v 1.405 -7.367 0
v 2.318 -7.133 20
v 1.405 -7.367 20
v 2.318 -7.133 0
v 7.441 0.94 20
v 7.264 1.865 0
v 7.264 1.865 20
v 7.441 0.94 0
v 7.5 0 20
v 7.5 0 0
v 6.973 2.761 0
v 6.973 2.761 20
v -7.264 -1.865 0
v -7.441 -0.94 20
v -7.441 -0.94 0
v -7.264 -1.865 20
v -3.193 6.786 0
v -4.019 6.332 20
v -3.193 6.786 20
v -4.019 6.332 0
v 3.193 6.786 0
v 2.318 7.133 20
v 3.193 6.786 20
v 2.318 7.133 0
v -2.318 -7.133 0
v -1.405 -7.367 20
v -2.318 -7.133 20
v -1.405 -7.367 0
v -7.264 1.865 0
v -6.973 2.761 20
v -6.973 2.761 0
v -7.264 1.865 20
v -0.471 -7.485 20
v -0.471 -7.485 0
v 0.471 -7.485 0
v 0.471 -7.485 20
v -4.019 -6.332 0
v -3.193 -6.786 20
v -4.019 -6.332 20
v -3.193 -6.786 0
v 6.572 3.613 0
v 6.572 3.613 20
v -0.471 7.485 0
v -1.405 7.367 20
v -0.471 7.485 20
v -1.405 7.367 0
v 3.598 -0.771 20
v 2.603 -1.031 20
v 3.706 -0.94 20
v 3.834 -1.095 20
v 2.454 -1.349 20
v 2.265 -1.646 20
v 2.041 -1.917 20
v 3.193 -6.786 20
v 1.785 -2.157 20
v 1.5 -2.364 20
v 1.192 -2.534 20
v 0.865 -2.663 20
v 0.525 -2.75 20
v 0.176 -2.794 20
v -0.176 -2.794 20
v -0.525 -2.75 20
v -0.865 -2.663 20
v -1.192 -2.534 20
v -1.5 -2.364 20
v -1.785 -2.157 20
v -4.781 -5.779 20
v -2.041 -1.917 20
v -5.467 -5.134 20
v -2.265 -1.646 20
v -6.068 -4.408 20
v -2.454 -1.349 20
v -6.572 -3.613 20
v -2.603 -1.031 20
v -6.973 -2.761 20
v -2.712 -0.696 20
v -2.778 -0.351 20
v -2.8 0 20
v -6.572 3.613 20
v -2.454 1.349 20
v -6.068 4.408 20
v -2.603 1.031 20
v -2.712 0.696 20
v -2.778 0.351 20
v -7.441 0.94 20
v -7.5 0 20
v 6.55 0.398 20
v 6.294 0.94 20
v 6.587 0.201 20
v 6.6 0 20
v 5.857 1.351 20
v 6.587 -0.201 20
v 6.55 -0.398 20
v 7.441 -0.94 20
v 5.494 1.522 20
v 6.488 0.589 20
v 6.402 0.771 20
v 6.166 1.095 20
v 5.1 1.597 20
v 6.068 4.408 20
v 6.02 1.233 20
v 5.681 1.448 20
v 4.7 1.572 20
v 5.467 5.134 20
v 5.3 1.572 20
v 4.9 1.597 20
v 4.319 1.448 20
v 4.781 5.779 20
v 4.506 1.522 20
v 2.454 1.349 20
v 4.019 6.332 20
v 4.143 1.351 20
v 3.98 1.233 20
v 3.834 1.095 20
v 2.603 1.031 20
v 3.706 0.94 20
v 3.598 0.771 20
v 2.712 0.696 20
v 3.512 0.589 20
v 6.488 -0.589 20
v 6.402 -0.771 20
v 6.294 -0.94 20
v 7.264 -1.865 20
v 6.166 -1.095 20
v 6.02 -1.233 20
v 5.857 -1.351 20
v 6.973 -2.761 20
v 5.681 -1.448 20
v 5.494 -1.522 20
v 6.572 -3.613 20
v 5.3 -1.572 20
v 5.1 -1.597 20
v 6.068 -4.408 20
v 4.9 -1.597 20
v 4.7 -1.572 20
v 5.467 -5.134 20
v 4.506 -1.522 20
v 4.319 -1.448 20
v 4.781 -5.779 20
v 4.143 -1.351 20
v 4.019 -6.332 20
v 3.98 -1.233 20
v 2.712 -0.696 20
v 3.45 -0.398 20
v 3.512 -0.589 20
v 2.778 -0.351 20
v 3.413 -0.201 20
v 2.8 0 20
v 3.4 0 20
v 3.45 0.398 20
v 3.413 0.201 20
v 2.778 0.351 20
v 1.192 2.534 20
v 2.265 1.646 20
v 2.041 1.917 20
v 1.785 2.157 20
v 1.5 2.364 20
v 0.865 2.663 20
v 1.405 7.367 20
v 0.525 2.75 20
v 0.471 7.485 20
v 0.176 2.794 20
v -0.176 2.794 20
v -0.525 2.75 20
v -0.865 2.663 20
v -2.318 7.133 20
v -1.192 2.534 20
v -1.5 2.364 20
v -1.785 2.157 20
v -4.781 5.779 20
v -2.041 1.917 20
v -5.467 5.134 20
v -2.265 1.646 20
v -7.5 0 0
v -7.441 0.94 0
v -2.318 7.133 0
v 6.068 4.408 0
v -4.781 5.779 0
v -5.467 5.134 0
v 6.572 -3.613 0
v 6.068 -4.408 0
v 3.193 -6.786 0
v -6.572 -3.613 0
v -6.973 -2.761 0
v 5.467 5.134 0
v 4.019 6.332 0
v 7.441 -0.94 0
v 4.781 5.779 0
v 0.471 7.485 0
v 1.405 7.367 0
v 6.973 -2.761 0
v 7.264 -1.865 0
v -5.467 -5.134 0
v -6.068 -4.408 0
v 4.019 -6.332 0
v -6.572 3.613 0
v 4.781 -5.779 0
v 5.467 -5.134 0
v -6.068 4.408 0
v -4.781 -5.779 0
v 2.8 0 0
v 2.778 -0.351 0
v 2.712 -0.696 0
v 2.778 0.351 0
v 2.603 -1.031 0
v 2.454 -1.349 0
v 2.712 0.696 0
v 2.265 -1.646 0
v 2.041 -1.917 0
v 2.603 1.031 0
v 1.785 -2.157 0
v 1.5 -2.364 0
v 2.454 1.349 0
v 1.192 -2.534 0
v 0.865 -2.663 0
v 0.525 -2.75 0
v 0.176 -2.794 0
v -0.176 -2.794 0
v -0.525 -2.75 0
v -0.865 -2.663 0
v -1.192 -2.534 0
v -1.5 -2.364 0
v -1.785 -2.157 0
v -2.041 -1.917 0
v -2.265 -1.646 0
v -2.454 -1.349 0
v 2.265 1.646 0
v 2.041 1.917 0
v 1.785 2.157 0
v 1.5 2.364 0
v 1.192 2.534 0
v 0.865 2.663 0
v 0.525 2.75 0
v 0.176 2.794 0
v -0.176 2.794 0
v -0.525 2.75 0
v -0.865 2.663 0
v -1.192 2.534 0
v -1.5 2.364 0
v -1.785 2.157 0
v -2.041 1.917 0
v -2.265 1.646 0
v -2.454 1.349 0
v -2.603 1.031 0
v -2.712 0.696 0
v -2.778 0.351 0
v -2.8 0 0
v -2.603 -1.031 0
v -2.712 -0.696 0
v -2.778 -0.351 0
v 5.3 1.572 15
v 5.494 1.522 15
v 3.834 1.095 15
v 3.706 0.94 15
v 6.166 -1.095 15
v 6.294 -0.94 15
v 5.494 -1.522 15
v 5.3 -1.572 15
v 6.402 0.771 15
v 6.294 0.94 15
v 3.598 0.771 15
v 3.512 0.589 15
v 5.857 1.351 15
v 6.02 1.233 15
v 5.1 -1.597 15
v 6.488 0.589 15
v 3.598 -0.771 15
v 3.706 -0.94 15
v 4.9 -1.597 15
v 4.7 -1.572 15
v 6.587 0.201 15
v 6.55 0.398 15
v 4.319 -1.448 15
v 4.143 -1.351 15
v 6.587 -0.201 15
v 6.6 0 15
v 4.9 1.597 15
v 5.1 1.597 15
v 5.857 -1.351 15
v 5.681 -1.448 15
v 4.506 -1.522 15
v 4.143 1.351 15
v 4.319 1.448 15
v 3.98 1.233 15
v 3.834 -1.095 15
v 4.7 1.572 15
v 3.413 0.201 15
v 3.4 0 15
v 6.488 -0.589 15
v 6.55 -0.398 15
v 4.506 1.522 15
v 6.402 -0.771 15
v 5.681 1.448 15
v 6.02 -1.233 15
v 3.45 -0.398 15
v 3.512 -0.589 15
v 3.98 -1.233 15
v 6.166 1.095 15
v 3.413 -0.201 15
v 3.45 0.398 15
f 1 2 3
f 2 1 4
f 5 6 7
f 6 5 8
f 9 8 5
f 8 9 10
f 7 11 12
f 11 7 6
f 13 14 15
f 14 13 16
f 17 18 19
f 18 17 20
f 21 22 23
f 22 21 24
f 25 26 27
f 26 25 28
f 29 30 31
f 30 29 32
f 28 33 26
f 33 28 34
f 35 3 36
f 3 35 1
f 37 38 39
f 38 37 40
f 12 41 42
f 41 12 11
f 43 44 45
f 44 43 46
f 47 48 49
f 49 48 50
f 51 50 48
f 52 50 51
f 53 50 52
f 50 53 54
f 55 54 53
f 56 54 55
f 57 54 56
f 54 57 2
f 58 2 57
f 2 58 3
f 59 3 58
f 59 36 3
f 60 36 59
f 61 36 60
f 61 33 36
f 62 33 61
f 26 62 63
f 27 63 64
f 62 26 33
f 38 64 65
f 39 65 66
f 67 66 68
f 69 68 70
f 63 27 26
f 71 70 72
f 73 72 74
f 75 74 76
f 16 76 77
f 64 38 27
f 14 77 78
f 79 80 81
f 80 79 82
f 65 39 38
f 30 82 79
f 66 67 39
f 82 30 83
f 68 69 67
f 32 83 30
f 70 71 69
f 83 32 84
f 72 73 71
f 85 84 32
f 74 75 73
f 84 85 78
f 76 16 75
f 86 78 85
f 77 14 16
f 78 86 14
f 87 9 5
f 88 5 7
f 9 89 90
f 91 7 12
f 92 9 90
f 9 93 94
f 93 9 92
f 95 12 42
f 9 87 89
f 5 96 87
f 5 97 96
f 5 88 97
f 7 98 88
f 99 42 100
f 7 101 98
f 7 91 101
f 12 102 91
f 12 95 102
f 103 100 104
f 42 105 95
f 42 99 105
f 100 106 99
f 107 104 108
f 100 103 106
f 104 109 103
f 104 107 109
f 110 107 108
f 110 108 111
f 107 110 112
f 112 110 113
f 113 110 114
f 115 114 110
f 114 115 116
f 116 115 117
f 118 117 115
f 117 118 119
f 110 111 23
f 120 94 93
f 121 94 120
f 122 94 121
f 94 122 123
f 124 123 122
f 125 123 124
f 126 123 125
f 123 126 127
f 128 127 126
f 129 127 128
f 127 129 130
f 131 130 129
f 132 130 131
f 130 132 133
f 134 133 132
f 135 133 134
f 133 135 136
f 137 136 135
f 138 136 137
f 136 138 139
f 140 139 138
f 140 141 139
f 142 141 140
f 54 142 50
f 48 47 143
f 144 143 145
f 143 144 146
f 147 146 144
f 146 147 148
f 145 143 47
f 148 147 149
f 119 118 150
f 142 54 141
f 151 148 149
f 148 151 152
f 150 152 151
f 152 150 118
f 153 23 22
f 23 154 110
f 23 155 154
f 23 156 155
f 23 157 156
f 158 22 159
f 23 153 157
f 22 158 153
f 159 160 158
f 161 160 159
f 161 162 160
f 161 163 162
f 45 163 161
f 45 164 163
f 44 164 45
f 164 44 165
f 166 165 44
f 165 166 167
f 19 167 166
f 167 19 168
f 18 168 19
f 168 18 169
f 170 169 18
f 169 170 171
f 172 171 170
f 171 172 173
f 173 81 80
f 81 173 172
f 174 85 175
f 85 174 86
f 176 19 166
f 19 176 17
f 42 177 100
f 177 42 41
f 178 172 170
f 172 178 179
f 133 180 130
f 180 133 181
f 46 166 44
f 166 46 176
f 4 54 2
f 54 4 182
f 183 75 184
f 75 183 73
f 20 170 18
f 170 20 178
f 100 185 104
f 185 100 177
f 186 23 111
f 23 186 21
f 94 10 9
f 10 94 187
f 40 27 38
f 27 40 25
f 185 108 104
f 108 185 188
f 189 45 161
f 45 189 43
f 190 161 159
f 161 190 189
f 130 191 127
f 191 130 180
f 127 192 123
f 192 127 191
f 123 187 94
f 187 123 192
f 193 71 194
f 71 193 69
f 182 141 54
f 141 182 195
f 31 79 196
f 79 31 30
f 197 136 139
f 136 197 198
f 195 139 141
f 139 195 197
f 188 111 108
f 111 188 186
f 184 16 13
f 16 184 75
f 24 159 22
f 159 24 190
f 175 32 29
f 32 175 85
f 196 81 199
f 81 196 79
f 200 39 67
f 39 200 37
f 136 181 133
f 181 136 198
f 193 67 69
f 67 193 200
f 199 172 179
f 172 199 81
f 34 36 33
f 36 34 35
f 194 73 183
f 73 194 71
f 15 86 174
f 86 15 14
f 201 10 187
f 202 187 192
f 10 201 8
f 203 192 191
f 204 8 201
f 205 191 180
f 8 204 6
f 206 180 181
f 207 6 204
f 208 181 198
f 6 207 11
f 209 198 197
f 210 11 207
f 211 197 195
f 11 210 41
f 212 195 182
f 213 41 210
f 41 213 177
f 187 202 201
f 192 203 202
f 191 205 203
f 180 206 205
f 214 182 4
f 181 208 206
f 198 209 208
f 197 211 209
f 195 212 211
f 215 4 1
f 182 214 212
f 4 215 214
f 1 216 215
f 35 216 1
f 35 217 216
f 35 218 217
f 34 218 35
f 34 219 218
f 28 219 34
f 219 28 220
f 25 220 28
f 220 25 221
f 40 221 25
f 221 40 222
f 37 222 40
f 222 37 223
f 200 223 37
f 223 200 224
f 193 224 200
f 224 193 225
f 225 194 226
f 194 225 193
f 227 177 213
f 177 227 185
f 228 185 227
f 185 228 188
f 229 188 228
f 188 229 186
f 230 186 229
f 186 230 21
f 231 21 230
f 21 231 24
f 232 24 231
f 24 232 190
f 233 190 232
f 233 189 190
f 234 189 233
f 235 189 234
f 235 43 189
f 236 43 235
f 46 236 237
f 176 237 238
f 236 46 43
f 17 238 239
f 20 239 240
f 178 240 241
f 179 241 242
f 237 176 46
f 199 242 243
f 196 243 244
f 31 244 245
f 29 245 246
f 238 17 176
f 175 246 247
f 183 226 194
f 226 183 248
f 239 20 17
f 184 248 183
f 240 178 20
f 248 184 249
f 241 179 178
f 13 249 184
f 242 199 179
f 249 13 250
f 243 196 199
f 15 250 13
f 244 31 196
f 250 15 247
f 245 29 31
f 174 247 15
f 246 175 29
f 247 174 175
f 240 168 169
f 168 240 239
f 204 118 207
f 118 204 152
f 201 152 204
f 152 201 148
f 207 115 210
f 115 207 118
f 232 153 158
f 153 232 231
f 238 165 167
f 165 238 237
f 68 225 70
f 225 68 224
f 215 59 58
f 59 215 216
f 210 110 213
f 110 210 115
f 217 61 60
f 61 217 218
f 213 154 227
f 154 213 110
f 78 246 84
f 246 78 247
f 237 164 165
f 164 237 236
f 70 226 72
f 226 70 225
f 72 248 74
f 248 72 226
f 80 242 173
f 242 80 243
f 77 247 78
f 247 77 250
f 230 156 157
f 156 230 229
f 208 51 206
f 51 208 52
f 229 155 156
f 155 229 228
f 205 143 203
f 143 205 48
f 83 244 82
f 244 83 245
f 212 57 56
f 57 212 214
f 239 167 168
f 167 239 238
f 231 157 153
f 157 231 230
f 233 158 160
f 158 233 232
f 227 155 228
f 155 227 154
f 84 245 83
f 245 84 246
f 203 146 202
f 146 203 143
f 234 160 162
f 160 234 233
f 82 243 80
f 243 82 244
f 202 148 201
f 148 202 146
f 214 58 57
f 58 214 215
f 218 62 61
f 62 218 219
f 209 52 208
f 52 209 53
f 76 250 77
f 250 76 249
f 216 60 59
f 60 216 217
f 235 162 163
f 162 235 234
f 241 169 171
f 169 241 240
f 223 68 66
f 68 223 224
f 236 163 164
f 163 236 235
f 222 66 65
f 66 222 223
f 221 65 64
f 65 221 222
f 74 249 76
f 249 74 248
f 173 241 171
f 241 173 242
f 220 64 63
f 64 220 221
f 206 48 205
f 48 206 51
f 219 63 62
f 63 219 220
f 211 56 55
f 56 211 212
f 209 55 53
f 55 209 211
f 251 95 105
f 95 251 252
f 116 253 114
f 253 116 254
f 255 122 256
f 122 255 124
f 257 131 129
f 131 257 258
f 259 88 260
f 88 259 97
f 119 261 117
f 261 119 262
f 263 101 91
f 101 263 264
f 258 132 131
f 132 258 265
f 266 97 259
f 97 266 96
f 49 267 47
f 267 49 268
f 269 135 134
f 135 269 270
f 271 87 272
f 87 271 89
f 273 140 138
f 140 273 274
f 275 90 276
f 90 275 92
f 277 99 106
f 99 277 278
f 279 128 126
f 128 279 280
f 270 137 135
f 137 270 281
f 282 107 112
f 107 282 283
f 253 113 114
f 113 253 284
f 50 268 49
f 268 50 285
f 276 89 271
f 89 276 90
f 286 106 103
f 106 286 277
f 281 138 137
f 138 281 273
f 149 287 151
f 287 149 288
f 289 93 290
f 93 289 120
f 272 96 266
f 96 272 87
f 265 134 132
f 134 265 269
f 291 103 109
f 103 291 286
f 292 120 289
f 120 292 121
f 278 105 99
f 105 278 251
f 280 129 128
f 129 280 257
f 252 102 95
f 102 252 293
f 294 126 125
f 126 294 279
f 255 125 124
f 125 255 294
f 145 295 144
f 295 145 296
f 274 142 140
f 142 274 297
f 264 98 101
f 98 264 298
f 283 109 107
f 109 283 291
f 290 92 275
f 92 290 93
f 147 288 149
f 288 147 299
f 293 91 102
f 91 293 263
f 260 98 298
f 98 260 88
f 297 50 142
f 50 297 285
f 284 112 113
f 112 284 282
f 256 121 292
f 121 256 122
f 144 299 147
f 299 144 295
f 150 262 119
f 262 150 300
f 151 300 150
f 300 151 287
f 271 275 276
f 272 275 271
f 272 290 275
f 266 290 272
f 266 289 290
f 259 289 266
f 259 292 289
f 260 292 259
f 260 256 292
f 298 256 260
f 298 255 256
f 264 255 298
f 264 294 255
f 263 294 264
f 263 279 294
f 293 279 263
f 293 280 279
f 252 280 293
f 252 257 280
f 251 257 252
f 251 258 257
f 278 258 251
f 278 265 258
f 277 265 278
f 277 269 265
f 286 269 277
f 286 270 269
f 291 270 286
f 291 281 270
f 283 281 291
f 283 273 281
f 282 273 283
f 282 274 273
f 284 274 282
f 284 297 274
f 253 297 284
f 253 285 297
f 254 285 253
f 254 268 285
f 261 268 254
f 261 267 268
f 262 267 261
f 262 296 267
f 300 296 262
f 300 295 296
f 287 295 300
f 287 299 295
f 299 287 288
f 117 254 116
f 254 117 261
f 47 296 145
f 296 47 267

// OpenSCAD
$fn = 50;
module body()
{
difference () 
{
cylinder(20,r=7.5);
cylinder(20,r=2.8);
}
}
difference () 
{
    body();
translate([5,0,15]) cylinder(5,r=1.6);
}
